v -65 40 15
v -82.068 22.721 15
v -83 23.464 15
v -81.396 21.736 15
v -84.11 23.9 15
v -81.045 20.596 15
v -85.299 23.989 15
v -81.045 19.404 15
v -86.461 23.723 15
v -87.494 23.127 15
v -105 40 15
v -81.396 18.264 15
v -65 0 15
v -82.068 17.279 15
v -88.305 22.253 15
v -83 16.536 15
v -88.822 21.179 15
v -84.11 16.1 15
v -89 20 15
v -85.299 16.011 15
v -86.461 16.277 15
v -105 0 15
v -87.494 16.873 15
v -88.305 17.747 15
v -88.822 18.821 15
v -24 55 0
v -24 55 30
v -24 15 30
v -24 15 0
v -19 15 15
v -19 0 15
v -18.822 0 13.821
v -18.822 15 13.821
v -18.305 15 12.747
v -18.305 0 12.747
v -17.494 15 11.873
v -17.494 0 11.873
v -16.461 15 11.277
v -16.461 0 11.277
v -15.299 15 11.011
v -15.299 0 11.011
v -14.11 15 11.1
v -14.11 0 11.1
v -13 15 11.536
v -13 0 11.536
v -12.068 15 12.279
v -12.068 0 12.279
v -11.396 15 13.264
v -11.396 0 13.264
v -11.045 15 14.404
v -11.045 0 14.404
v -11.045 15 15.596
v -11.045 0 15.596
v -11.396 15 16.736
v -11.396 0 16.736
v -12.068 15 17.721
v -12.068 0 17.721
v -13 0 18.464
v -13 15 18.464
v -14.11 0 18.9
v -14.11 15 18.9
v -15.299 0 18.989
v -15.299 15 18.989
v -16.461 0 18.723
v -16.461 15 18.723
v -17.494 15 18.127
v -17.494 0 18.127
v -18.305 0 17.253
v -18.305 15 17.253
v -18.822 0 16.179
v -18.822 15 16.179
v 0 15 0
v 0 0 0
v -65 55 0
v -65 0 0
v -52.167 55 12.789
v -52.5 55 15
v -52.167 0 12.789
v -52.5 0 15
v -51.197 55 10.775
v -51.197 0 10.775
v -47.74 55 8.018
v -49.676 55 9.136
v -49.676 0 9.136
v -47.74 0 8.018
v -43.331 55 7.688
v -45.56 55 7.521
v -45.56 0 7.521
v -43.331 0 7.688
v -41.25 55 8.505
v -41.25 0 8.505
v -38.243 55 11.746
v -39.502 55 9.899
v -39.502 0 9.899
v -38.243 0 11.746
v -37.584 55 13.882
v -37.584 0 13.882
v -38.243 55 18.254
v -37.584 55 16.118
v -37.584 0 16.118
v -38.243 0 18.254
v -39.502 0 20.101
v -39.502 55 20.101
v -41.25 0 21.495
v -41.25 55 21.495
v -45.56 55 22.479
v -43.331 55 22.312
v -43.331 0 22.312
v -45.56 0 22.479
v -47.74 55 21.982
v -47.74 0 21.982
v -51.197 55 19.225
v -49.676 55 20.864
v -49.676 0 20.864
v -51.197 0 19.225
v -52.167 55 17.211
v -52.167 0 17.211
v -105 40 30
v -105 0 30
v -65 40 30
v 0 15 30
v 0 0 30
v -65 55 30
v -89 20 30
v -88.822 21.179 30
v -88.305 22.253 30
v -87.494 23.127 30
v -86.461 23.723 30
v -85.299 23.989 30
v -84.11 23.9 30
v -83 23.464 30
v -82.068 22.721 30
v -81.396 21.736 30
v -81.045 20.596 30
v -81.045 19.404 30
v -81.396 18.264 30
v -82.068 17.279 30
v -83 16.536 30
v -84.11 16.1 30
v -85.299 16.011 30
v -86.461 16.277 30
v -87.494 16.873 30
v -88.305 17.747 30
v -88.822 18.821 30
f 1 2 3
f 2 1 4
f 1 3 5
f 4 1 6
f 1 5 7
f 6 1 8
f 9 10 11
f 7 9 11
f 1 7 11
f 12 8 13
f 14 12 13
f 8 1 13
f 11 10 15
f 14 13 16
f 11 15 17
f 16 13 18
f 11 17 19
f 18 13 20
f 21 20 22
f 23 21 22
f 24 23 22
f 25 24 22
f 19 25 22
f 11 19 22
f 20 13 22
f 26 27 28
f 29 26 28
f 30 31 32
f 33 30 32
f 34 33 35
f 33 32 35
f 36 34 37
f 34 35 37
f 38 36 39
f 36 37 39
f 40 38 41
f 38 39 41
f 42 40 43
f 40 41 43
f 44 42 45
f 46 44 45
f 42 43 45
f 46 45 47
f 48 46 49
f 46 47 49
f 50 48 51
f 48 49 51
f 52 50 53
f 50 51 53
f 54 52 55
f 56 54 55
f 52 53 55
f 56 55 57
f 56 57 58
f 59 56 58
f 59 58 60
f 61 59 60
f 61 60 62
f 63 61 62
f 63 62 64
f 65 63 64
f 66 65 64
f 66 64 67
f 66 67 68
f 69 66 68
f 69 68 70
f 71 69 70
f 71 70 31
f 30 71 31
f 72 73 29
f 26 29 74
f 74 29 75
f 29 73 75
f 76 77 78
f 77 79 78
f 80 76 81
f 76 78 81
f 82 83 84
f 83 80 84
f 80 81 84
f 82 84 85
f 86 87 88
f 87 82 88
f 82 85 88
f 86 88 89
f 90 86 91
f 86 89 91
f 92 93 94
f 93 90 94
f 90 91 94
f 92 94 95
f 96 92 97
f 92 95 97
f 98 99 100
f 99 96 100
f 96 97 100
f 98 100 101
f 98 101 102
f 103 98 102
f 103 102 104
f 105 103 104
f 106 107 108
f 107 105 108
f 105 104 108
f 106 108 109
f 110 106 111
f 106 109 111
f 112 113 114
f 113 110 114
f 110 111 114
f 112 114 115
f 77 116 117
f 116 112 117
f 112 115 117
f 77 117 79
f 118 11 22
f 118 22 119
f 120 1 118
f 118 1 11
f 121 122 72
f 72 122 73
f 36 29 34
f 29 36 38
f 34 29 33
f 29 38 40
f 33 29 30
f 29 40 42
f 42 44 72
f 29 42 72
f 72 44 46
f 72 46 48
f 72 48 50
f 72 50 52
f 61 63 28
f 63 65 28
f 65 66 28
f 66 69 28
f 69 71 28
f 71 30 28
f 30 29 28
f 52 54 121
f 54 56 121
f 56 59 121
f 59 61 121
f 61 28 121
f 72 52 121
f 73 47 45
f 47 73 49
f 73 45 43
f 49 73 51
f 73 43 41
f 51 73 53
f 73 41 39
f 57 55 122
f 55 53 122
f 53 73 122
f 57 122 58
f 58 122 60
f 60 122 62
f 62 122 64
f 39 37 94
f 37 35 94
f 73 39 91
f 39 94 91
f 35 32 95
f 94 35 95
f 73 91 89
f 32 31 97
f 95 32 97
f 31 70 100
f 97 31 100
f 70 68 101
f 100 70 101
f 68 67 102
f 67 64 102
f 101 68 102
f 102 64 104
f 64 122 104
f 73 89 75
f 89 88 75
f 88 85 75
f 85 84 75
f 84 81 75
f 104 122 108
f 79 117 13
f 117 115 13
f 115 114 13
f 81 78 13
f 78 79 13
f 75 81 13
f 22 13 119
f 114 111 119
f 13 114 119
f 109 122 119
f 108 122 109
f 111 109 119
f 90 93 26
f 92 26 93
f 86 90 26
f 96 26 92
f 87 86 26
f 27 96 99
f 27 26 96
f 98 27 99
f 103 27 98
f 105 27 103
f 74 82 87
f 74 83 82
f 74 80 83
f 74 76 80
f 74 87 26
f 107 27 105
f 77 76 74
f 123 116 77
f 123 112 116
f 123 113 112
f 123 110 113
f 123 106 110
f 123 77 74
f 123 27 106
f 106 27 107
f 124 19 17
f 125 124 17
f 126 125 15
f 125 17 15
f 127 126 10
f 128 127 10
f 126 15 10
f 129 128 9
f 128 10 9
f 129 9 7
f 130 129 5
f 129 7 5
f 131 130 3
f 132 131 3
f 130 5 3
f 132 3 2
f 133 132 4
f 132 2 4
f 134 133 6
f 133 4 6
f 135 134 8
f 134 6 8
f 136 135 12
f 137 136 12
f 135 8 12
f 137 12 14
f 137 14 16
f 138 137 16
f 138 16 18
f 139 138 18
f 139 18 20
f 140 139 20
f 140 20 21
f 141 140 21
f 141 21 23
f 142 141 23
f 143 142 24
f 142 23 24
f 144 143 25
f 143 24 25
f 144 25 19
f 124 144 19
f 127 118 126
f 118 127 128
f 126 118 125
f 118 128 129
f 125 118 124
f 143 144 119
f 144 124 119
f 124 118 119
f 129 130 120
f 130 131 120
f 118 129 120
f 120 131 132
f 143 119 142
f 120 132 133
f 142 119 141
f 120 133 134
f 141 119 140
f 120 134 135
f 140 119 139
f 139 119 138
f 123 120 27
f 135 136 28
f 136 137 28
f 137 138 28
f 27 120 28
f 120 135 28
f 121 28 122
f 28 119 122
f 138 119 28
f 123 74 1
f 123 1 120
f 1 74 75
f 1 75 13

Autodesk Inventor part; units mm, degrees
ref_plane "YZ Plane" through (0, 0, 0) normal (1, 0, 0) x (0, 1, 0)
ref_plane "XZ Plane" through (0, 0, 0) normal (0, 1, 0) x (-1, 0, 0)
ref_plane "XY Plane" through (0, 0, 0) normal (0, 0, 1) x (1, 0, 0)
sketch "Sketch1" plane through (0, 0, 0) normal (0, 1, 0) x (-1, 0, 0)
  line L0 (0, 0) -> (105, 0)
  line L1 (105, 0) -> (105, 30)
  line L2 (105, 30) -> (0, 30)
  line L3 (0, 30) -> (0, 0)
  line L4 (105, 0) -> (65, 0)
  line L5 (65, 0) -> (65, 15)
  line L6 (65, 15) -> (105, 15)
  line L7 (105, 15) -> (105, 0)
  line L8 (0, 15) -> (15, 15)
  line L9 (15, 15) -> (45, 15)
  circle A0 centre (15, 15) radius 4
  circle A1 centre (45, 15) radius 7.5
  dimension "d0" = 105
  dimension "d1" = 30
  dimension "d2" = 40
  dimension "d3" = 15
  dimension "d4" = 15
  dimension "d5" = 30
  dimension "d6" = 8
  dimension "d7" = 15
extrude "Extrusion1" add sketch "Sketch1" along normal blind 55 contours L3 L2 L1 L6 L5 L0
sketch "Sketch2" plane through (-105, 0, 30) normal (0, 0, 1) x (1, 0, 0)
  line L0 (105, 55) -> (81, 55)
  line L1 (81, 55) -> (81, 15)
  line L2 (81, 15) -> (105, 15)
  line L3 (105, 15) -> (105, 55)
  dimension "d10" = 24
  dimension "d11" = 40
extrude "Extrusion2" cut sketch "Sketch2" against normal blind 55
sketch "Sketch3" plane through (-65, 0, 15) normal (0, 0, -1) x (-1, 0, 0)
  line L0 (40, 55) -> (0, 55)
  line L1 (0, 55) -> (0, 40)
  line L2 (0, 40) -> (40, 40)
  line L3 (40, 40) -> (40, 55)
  circle A0 centre (20, 20) radius 4
  point P0 (-65, 0)
  dimension "d15" = 15
  dimension "d16" = 8
extrude "Extrusion3" cut sketch "Sketch3" against normal blind 55
properties part number "X_Top_PullySide_V2" material "Birch"
